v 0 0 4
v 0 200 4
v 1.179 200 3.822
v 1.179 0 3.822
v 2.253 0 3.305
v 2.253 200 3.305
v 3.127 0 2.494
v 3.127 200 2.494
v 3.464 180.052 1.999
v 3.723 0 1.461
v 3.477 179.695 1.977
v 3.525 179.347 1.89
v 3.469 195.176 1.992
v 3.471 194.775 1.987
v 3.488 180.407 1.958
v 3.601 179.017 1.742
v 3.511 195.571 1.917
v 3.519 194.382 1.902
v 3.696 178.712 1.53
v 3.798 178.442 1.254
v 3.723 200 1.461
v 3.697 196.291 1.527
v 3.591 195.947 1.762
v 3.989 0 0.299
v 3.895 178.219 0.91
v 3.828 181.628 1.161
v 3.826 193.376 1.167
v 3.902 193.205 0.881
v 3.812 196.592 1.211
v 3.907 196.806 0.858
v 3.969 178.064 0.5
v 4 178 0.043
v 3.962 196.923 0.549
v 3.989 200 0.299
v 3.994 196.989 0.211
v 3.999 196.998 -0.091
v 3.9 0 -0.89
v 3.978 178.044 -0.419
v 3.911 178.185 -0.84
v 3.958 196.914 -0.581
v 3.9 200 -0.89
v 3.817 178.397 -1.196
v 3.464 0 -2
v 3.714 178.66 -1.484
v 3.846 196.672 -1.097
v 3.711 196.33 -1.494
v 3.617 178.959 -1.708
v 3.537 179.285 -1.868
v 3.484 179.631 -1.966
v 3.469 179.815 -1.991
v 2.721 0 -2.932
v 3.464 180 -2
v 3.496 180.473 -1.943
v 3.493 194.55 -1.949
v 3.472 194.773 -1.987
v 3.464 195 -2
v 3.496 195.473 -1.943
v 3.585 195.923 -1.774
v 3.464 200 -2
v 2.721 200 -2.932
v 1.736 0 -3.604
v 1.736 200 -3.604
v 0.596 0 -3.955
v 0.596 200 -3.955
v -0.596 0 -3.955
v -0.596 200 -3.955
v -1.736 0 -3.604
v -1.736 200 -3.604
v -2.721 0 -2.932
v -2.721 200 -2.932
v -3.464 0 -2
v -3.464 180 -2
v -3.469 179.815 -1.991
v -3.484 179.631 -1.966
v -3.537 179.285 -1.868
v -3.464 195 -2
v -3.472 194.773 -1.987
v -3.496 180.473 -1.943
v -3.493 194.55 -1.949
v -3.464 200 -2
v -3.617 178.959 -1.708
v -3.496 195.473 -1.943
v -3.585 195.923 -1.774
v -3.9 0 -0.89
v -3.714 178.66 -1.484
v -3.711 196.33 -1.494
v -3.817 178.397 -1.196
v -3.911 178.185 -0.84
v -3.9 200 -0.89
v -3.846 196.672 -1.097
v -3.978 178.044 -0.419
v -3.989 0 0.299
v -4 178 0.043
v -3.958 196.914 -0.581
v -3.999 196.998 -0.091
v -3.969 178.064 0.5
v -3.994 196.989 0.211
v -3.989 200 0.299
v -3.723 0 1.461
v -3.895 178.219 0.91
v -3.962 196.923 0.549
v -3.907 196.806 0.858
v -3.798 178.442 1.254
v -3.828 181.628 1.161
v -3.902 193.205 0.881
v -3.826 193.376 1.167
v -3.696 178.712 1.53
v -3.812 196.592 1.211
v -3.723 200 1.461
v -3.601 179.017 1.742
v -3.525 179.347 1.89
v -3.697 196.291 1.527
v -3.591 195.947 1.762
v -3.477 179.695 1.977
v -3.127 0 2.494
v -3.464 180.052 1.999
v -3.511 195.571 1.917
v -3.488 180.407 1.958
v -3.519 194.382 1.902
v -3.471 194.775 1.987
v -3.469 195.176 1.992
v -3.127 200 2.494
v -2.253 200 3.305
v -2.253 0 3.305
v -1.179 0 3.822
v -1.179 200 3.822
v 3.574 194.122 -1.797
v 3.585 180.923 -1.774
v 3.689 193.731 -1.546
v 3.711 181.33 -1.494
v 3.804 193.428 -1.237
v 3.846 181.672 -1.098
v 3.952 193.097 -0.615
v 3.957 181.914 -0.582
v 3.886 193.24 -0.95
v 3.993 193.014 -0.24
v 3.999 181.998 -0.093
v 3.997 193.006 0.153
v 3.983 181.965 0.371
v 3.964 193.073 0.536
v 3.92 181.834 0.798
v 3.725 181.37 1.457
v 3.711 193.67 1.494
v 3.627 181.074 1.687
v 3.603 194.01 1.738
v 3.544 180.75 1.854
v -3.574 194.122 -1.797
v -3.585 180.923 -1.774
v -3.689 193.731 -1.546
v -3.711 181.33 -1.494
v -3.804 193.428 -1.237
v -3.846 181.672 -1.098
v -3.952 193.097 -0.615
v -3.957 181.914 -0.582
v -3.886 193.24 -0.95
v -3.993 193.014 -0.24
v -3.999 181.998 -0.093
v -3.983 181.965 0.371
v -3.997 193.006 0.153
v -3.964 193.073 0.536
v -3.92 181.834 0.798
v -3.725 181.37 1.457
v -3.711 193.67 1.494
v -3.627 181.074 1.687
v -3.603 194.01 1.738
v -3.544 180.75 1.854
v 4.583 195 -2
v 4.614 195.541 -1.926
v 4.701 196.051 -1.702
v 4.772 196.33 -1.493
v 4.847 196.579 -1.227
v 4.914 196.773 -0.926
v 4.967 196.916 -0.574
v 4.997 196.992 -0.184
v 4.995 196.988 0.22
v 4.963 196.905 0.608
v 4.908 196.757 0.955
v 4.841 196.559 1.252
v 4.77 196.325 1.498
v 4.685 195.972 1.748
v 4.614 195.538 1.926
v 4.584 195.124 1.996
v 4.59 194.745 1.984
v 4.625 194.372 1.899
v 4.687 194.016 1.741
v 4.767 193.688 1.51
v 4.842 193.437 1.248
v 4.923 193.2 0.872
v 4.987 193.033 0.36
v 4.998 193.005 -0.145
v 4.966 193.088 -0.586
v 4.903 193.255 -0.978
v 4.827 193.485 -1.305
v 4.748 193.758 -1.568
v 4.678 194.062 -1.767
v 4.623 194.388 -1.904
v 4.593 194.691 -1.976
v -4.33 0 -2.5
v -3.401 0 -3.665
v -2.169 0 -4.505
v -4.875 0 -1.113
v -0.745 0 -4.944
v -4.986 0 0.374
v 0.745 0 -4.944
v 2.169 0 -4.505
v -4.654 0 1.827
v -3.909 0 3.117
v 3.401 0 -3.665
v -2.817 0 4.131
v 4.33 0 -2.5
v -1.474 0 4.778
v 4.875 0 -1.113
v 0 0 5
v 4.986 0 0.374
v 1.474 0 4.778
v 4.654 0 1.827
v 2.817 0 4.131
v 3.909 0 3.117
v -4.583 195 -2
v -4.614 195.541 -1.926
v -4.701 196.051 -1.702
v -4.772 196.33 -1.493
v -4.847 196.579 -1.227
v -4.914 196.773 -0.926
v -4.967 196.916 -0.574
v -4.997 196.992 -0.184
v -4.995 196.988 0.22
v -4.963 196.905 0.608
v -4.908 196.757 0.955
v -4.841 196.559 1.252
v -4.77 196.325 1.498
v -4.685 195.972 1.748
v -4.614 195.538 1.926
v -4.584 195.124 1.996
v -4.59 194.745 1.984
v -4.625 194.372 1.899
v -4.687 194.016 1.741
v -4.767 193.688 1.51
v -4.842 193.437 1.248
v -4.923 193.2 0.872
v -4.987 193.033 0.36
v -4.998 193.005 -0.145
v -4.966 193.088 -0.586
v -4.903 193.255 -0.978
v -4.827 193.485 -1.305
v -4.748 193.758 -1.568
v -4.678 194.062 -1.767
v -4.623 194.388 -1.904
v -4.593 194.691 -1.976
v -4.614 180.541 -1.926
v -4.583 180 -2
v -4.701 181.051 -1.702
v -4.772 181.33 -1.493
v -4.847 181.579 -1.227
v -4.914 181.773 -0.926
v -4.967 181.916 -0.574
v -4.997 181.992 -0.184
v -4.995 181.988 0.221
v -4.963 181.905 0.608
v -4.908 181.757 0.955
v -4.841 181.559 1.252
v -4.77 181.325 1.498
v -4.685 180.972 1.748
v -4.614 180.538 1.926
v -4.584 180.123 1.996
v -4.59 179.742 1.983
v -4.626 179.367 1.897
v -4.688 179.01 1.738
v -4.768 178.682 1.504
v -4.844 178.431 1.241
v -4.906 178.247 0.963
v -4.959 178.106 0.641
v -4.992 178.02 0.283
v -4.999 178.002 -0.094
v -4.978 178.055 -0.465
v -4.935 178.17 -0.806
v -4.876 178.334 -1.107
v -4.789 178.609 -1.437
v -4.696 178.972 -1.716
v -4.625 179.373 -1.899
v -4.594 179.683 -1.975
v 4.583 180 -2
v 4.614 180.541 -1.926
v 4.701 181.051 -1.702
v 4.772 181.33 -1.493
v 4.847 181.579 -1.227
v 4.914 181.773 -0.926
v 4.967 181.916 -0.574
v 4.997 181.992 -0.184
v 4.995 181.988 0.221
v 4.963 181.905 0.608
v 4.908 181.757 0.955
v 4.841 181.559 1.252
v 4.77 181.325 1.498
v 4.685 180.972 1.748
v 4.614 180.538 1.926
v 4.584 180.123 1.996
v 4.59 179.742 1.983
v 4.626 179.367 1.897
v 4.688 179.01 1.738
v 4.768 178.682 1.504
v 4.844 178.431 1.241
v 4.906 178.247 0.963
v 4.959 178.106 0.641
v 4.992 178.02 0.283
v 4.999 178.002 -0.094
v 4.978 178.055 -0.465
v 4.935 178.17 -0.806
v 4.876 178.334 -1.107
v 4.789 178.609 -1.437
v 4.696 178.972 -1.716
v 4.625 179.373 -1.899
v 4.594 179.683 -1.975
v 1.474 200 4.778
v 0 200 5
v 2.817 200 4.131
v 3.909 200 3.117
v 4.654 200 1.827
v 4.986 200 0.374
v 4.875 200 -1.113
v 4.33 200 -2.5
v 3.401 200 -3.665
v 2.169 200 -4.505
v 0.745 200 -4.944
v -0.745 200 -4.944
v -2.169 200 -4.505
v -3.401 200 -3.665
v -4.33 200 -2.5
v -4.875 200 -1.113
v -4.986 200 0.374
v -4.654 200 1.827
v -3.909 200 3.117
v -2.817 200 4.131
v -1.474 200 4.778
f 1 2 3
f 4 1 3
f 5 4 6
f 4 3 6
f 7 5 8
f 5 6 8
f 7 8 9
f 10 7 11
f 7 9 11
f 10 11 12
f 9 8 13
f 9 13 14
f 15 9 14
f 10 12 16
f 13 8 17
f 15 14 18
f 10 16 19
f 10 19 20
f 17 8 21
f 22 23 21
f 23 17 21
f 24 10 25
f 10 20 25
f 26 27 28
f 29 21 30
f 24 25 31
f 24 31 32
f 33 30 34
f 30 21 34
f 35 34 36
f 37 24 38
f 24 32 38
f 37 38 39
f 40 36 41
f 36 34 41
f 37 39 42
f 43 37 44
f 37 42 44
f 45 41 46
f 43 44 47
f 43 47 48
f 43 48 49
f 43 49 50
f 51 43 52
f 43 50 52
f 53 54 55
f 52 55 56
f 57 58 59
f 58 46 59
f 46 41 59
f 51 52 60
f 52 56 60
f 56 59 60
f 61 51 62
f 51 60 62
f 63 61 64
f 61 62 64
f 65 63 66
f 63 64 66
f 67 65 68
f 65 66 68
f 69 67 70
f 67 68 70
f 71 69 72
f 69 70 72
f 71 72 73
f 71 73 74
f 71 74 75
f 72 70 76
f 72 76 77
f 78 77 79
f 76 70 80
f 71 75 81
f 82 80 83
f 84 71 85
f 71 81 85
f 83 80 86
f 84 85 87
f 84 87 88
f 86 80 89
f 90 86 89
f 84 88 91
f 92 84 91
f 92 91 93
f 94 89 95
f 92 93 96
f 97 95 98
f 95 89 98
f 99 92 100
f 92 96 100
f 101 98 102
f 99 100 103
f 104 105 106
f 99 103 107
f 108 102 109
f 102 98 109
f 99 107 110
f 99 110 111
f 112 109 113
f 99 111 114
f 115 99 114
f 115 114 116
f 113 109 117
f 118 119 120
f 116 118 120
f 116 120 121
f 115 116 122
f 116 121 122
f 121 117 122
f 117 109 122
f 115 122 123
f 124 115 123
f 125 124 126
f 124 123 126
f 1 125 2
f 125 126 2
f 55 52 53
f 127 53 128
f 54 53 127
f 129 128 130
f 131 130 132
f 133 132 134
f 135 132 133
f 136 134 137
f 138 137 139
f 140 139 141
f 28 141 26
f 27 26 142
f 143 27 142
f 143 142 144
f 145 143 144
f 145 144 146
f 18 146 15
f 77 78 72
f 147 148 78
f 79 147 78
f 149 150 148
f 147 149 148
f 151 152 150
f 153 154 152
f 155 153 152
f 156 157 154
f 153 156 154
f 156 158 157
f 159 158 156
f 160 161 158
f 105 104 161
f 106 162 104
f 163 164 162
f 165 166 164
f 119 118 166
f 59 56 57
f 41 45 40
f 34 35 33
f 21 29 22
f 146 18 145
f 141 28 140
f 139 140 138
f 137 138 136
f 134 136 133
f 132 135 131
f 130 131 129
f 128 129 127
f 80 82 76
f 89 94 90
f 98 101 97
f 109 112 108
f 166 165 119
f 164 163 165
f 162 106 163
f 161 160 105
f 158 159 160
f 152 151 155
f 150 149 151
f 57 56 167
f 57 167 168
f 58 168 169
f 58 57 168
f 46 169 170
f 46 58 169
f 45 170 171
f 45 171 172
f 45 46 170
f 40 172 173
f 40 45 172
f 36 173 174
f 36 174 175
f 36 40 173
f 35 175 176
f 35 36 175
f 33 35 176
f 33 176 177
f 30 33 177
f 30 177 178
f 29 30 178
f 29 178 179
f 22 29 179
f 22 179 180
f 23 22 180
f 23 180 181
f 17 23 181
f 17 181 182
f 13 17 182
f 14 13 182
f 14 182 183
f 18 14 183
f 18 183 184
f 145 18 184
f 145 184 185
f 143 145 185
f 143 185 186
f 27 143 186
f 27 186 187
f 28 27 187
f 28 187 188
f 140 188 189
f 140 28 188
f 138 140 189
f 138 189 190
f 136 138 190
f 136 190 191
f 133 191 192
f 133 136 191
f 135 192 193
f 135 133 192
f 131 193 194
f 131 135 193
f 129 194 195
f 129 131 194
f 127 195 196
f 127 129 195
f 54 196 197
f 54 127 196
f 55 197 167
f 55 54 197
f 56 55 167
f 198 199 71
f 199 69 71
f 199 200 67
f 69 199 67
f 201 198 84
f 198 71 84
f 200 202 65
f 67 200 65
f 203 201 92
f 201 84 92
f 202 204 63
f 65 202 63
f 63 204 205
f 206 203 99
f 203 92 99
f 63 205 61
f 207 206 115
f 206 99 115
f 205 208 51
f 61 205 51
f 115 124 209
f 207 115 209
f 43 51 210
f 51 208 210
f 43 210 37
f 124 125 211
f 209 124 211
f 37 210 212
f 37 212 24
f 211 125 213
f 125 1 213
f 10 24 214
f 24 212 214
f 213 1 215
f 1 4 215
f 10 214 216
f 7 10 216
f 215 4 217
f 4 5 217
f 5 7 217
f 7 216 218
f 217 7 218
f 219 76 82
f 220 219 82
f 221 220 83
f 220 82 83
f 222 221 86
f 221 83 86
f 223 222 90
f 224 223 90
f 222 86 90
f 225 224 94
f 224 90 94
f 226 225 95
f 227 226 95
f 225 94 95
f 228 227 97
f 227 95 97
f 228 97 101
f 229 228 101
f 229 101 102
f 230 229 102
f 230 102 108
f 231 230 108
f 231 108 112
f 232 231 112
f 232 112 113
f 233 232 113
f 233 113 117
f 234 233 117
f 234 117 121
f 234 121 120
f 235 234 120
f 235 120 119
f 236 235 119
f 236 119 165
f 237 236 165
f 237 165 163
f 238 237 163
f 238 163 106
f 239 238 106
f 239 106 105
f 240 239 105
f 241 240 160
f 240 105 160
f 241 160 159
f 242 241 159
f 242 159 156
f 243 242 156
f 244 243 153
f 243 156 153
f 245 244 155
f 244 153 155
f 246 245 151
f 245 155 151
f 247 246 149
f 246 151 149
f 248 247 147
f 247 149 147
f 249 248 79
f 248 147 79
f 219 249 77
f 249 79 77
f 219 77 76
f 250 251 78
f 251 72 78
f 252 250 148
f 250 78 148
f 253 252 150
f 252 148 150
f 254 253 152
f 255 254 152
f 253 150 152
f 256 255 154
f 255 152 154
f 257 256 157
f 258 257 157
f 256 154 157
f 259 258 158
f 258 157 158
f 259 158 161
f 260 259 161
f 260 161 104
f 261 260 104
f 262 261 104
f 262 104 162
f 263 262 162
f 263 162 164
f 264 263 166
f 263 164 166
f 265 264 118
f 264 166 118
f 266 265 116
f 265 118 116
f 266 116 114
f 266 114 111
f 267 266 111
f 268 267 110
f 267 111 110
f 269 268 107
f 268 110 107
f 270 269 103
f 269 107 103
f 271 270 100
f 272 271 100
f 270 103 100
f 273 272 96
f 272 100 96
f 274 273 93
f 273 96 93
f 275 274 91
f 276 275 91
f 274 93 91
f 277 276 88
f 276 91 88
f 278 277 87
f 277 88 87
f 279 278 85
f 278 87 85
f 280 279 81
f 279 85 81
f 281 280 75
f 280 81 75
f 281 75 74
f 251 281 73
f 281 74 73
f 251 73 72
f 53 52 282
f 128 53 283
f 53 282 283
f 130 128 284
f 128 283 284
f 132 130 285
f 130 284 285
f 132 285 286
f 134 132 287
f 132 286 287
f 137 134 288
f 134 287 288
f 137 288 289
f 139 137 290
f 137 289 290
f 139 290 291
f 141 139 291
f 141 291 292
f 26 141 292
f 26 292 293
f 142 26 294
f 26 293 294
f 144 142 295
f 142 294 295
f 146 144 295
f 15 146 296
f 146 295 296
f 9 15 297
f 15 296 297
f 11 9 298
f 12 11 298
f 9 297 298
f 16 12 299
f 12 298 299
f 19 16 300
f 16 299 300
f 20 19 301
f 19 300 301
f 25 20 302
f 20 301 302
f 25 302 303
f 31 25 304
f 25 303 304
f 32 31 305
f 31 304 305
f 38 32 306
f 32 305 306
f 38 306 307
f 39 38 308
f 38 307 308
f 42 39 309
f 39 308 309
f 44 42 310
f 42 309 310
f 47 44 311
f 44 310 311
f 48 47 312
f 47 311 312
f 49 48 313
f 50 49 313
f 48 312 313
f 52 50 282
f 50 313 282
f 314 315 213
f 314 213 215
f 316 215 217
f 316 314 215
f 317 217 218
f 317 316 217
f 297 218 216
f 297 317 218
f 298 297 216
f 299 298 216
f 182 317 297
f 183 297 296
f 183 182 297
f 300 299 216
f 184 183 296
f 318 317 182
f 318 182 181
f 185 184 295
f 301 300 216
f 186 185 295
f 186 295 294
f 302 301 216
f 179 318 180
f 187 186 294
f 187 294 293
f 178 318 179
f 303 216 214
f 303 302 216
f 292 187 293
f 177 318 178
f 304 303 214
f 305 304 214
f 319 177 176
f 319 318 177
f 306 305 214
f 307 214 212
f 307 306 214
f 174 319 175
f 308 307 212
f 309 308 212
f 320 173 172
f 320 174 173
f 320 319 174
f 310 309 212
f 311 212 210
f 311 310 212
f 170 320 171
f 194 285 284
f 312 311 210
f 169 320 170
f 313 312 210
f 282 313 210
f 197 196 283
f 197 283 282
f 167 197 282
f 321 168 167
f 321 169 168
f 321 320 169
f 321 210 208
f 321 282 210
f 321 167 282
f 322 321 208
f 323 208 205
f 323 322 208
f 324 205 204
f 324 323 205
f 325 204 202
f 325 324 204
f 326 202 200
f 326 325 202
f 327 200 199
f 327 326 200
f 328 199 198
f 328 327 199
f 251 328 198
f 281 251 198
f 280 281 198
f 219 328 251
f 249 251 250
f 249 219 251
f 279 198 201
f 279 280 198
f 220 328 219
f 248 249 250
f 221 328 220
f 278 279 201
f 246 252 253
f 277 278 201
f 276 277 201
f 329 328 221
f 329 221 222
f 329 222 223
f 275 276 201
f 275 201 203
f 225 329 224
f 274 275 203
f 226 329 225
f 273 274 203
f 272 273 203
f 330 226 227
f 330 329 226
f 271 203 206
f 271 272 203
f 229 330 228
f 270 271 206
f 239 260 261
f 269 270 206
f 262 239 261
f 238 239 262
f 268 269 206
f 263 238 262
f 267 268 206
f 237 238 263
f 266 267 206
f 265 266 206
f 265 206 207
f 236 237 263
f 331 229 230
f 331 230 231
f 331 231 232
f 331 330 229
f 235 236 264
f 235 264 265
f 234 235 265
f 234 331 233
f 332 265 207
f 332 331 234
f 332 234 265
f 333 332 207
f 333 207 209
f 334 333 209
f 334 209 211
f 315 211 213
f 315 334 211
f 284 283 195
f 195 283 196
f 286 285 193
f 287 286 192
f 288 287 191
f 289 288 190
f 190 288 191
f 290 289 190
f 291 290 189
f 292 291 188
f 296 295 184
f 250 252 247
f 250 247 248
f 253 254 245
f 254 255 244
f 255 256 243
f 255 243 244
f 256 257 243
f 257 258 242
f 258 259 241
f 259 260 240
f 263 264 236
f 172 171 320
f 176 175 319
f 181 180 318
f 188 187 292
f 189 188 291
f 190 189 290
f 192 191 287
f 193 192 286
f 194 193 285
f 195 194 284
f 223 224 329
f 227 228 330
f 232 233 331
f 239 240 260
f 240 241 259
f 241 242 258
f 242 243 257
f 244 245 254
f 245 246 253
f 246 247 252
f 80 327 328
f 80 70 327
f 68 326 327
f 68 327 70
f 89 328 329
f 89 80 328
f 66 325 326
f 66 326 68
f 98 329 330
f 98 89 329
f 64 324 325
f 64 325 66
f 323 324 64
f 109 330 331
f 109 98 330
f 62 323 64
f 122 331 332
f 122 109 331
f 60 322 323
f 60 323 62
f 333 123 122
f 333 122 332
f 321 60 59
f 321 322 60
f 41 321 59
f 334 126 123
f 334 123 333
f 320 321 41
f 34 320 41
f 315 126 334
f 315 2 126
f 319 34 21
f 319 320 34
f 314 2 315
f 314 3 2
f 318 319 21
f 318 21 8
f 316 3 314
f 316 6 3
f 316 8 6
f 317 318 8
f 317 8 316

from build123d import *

# Parameters (mm, degrees)
SKETCH_2_R          = 3
SKETCH_2_R_2        = 1.5
EXTRUDE_1_DEPTH     = 200
SKETCH_3_R          = 5
EXTRUDE_2_DEPTH     = 200
SKETCH_4_R          = 4
CUT_EXTRUDE_1_DEPTH = 200
SKETCH_5_R          = 2
CUT_EXTRUDE_5_DEPTH = 100


with BuildPart() as part:
    # 草图2 → 凸台-拉伸1 (new body)
    with BuildSketch(Plane(origin=(0, 0, 0), x_dir=(1, 0, 0), z_dir=(0, 1, 0))):
        with Locations(Location((0, 0, 0), (0, 0, 270))):
            Circle(SKETCH_2_R)
        with Locations(Location((0, 0, 0), (0, 0, 270))):
            Circle(SKETCH_2_R_2, mode=Mode.SUBTRACT)
    extrude(amount=EXTRUDE_1_DEPTH)

    # 草图3 → 凸台-拉伸2 (add)
    with BuildSketch(Plane(origin=(0, 200, 0), x_dir=(1, 0, 0), z_dir=(0, 1, 0))):
        with Locations(Location((0, 0, 0), (0, 0, 270))):
            Circle(SKETCH_3_R)
    extrude(amount=-EXTRUDE_2_DEPTH)

    # 草图4 → 切除-拉伸1 (cut)
    with BuildSketch(Plane(origin=(0, 200, 0), x_dir=(1, 0, 0), z_dir=(0, 1, 0))):
        with Locations(Location((0, 0, 0), (0, 0, 270))):
            Circle(SKETCH_4_R)
    extrude(amount=-CUT_EXTRUDE_1_DEPTH, mode=Mode.SUBTRACT)

    # 草图5 → 切除-拉伸5 (cut, symmetric)
    with BuildSketch(Plane(origin=(0, 0, 0), x_dir=(0, 0, -1), z_dir=(1, 0, 0))):
        with Locations((0, 195)):
            Circle(SKETCH_5_R)
        with Locations((0, 180)):
            Circle(SKETCH_5_R)
    extrude(amount=CUT_EXTRUDE_5_DEPTH, both=True, mode=Mode.SUBTRACT)


solid = part.part
